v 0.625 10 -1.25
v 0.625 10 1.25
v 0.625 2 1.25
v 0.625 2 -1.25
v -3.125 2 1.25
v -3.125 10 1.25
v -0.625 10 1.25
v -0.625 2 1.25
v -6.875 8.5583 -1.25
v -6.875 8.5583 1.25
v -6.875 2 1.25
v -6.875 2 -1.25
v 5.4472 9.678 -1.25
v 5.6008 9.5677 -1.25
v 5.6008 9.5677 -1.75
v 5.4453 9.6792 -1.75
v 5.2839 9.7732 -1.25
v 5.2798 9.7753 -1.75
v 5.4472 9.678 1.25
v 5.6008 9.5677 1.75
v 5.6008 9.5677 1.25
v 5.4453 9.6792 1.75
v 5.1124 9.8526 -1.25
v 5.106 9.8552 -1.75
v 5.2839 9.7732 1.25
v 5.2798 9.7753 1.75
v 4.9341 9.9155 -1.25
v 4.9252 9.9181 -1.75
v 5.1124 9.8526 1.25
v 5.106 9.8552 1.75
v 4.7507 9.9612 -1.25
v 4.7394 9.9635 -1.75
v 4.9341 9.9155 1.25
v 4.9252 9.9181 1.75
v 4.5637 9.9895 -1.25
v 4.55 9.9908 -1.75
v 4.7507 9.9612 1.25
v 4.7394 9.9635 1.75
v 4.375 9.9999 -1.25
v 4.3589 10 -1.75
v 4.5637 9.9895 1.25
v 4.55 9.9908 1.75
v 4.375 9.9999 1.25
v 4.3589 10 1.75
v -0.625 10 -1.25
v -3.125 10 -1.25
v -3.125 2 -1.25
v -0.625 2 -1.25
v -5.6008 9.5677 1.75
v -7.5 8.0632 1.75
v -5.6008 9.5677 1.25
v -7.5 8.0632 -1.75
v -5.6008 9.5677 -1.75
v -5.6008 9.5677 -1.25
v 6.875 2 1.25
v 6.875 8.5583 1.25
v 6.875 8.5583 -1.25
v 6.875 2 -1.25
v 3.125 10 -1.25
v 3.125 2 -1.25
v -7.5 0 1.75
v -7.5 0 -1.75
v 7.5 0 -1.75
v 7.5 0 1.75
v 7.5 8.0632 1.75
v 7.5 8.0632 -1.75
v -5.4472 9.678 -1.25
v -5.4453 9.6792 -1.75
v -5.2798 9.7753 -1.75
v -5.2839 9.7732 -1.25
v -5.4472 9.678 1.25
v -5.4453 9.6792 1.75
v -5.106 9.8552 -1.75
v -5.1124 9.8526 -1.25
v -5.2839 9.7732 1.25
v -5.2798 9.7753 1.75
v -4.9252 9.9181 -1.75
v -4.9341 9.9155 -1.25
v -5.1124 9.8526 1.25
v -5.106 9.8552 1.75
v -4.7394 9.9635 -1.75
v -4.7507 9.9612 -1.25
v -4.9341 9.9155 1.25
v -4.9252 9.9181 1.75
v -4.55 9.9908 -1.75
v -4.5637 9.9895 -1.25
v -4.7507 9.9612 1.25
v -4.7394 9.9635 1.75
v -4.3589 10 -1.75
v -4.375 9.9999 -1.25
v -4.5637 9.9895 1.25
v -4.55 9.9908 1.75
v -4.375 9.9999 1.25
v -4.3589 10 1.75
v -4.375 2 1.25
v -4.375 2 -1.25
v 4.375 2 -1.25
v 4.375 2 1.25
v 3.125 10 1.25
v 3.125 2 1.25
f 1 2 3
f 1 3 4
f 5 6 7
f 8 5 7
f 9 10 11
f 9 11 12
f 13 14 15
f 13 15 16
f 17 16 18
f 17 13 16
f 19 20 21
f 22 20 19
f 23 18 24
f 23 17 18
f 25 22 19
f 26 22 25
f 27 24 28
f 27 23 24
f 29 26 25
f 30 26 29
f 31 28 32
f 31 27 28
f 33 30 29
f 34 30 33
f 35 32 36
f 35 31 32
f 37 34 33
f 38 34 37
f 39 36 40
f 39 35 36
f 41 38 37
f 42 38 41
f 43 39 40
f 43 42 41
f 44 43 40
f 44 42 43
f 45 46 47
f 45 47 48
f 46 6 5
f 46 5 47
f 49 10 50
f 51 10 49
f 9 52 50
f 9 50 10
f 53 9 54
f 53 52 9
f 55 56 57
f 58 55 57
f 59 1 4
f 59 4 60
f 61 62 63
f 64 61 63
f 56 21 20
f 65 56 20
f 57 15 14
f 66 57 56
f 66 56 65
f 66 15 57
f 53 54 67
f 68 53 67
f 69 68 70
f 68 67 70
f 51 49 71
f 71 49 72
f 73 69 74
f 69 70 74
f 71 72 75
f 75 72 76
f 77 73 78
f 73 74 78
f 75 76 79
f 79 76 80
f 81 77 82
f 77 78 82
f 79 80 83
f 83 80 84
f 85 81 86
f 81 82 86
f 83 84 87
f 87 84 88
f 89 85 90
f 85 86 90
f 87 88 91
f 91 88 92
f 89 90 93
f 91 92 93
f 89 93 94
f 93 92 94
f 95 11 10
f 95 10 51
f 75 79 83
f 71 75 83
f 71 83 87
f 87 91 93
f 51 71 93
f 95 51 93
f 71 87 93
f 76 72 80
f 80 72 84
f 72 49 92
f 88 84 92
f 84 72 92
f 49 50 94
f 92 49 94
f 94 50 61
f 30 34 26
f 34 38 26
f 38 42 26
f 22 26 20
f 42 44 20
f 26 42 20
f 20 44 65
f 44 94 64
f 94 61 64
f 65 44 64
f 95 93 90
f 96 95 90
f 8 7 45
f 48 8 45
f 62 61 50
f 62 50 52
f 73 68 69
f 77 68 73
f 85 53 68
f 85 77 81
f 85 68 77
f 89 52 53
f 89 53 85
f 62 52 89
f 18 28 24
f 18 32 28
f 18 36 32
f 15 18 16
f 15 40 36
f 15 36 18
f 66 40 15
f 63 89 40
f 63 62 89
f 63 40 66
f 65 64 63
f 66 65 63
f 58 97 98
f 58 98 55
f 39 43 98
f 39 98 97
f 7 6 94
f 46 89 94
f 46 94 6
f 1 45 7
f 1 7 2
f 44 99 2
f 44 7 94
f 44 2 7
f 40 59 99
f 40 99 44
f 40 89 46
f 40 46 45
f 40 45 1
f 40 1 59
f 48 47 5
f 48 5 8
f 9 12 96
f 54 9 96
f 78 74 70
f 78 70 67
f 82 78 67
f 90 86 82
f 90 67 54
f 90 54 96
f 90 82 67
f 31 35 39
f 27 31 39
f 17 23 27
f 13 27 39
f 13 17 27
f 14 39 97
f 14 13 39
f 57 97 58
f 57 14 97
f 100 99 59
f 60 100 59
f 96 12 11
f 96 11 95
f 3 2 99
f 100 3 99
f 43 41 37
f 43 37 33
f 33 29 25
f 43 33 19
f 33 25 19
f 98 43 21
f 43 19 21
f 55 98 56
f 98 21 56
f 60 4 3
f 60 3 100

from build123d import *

# Parameters (mm, degrees)
SKETCH1_W               = 15
SKETCH1_H               = 3.5
BOSS_EXTRUDE1_DEPTH     = 10
CUT_EXTRUDE1_DEPTH      = 13.980754986
CUT_EXTRUDE1_DEPTH_BACK = 13.980754986
FILLET1_R               = 2
SKETCH3_W               = 2.5
SKETCH3_H               = 2.5
CUT_EXTRUDE2_DEPTH      = 8


with BuildPart() as part:
    # Sketch1 → Boss-Extrude1 (new body)
    with BuildSketch(Plane(origin=(0, 0, 0), x_dir=(1, 0, 0), z_dir=(0, 1, 0))):
        Rectangle(SKETCH1_W, SKETCH1_H)
    extrude(amount=BOSS_EXTRUDE1_DEPTH)

    # Sketch2 → Cut-Extrude1 (cut, two sides: drawn at the far end of the back side and taken through both)
    with BuildSketch(Plane.XY.offset(1.75).offset(-CUT_EXTRUDE1_DEPTH_BACK)):
        Polygon((-42.036351416, -19.295421035), (-7.5, 8.063187399), (-5.0550496, 10), (5.0550496, 10), (7.5, 8.063187399), (42.036351416, -19.295421035), (42.036351416, 68.823885013), (-42.036351416, 68.823885013), align=None)
    extrude(amount=CUT_EXTRUDE1_DEPTH + CUT_EXTRUDE1_DEPTH_BACK, mode=Mode.SUBTRACT)

    # Fillet1
    fillet1_edges = [part.edges().sort_by_distance(p)[0] for p in [
        (5.0550496, 10, 0),
        (-5.0550496, 10, 0),
    ]]
    fillet(fillet1_edges, radius=FILLET1_R)

    # Sketch3 → Cut-Extrude2 (cut)
    with BuildSketch(Plane(origin=(0, 10, 0), x_dir=(1, 0, 0), z_dir=(0, 1, 0))):
        with Locations((-1.875, 0)):
            Rectangle(SKETCH3_W, SKETCH3_H)
        with Locations((-5.625, 0)):
            Rectangle(SKETCH3_W, SKETCH3_H)
        with Locations((5.625, 0)):
            Rectangle(SKETCH3_W, SKETCH3_H)
        with Locations((1.875, 0)):
            Rectangle(SKETCH3_W, SKETCH3_H)
    extrude(amount=-CUT_EXTRUDE2_DEPTH, mode=Mode.SUBTRACT)


solid = part.part
